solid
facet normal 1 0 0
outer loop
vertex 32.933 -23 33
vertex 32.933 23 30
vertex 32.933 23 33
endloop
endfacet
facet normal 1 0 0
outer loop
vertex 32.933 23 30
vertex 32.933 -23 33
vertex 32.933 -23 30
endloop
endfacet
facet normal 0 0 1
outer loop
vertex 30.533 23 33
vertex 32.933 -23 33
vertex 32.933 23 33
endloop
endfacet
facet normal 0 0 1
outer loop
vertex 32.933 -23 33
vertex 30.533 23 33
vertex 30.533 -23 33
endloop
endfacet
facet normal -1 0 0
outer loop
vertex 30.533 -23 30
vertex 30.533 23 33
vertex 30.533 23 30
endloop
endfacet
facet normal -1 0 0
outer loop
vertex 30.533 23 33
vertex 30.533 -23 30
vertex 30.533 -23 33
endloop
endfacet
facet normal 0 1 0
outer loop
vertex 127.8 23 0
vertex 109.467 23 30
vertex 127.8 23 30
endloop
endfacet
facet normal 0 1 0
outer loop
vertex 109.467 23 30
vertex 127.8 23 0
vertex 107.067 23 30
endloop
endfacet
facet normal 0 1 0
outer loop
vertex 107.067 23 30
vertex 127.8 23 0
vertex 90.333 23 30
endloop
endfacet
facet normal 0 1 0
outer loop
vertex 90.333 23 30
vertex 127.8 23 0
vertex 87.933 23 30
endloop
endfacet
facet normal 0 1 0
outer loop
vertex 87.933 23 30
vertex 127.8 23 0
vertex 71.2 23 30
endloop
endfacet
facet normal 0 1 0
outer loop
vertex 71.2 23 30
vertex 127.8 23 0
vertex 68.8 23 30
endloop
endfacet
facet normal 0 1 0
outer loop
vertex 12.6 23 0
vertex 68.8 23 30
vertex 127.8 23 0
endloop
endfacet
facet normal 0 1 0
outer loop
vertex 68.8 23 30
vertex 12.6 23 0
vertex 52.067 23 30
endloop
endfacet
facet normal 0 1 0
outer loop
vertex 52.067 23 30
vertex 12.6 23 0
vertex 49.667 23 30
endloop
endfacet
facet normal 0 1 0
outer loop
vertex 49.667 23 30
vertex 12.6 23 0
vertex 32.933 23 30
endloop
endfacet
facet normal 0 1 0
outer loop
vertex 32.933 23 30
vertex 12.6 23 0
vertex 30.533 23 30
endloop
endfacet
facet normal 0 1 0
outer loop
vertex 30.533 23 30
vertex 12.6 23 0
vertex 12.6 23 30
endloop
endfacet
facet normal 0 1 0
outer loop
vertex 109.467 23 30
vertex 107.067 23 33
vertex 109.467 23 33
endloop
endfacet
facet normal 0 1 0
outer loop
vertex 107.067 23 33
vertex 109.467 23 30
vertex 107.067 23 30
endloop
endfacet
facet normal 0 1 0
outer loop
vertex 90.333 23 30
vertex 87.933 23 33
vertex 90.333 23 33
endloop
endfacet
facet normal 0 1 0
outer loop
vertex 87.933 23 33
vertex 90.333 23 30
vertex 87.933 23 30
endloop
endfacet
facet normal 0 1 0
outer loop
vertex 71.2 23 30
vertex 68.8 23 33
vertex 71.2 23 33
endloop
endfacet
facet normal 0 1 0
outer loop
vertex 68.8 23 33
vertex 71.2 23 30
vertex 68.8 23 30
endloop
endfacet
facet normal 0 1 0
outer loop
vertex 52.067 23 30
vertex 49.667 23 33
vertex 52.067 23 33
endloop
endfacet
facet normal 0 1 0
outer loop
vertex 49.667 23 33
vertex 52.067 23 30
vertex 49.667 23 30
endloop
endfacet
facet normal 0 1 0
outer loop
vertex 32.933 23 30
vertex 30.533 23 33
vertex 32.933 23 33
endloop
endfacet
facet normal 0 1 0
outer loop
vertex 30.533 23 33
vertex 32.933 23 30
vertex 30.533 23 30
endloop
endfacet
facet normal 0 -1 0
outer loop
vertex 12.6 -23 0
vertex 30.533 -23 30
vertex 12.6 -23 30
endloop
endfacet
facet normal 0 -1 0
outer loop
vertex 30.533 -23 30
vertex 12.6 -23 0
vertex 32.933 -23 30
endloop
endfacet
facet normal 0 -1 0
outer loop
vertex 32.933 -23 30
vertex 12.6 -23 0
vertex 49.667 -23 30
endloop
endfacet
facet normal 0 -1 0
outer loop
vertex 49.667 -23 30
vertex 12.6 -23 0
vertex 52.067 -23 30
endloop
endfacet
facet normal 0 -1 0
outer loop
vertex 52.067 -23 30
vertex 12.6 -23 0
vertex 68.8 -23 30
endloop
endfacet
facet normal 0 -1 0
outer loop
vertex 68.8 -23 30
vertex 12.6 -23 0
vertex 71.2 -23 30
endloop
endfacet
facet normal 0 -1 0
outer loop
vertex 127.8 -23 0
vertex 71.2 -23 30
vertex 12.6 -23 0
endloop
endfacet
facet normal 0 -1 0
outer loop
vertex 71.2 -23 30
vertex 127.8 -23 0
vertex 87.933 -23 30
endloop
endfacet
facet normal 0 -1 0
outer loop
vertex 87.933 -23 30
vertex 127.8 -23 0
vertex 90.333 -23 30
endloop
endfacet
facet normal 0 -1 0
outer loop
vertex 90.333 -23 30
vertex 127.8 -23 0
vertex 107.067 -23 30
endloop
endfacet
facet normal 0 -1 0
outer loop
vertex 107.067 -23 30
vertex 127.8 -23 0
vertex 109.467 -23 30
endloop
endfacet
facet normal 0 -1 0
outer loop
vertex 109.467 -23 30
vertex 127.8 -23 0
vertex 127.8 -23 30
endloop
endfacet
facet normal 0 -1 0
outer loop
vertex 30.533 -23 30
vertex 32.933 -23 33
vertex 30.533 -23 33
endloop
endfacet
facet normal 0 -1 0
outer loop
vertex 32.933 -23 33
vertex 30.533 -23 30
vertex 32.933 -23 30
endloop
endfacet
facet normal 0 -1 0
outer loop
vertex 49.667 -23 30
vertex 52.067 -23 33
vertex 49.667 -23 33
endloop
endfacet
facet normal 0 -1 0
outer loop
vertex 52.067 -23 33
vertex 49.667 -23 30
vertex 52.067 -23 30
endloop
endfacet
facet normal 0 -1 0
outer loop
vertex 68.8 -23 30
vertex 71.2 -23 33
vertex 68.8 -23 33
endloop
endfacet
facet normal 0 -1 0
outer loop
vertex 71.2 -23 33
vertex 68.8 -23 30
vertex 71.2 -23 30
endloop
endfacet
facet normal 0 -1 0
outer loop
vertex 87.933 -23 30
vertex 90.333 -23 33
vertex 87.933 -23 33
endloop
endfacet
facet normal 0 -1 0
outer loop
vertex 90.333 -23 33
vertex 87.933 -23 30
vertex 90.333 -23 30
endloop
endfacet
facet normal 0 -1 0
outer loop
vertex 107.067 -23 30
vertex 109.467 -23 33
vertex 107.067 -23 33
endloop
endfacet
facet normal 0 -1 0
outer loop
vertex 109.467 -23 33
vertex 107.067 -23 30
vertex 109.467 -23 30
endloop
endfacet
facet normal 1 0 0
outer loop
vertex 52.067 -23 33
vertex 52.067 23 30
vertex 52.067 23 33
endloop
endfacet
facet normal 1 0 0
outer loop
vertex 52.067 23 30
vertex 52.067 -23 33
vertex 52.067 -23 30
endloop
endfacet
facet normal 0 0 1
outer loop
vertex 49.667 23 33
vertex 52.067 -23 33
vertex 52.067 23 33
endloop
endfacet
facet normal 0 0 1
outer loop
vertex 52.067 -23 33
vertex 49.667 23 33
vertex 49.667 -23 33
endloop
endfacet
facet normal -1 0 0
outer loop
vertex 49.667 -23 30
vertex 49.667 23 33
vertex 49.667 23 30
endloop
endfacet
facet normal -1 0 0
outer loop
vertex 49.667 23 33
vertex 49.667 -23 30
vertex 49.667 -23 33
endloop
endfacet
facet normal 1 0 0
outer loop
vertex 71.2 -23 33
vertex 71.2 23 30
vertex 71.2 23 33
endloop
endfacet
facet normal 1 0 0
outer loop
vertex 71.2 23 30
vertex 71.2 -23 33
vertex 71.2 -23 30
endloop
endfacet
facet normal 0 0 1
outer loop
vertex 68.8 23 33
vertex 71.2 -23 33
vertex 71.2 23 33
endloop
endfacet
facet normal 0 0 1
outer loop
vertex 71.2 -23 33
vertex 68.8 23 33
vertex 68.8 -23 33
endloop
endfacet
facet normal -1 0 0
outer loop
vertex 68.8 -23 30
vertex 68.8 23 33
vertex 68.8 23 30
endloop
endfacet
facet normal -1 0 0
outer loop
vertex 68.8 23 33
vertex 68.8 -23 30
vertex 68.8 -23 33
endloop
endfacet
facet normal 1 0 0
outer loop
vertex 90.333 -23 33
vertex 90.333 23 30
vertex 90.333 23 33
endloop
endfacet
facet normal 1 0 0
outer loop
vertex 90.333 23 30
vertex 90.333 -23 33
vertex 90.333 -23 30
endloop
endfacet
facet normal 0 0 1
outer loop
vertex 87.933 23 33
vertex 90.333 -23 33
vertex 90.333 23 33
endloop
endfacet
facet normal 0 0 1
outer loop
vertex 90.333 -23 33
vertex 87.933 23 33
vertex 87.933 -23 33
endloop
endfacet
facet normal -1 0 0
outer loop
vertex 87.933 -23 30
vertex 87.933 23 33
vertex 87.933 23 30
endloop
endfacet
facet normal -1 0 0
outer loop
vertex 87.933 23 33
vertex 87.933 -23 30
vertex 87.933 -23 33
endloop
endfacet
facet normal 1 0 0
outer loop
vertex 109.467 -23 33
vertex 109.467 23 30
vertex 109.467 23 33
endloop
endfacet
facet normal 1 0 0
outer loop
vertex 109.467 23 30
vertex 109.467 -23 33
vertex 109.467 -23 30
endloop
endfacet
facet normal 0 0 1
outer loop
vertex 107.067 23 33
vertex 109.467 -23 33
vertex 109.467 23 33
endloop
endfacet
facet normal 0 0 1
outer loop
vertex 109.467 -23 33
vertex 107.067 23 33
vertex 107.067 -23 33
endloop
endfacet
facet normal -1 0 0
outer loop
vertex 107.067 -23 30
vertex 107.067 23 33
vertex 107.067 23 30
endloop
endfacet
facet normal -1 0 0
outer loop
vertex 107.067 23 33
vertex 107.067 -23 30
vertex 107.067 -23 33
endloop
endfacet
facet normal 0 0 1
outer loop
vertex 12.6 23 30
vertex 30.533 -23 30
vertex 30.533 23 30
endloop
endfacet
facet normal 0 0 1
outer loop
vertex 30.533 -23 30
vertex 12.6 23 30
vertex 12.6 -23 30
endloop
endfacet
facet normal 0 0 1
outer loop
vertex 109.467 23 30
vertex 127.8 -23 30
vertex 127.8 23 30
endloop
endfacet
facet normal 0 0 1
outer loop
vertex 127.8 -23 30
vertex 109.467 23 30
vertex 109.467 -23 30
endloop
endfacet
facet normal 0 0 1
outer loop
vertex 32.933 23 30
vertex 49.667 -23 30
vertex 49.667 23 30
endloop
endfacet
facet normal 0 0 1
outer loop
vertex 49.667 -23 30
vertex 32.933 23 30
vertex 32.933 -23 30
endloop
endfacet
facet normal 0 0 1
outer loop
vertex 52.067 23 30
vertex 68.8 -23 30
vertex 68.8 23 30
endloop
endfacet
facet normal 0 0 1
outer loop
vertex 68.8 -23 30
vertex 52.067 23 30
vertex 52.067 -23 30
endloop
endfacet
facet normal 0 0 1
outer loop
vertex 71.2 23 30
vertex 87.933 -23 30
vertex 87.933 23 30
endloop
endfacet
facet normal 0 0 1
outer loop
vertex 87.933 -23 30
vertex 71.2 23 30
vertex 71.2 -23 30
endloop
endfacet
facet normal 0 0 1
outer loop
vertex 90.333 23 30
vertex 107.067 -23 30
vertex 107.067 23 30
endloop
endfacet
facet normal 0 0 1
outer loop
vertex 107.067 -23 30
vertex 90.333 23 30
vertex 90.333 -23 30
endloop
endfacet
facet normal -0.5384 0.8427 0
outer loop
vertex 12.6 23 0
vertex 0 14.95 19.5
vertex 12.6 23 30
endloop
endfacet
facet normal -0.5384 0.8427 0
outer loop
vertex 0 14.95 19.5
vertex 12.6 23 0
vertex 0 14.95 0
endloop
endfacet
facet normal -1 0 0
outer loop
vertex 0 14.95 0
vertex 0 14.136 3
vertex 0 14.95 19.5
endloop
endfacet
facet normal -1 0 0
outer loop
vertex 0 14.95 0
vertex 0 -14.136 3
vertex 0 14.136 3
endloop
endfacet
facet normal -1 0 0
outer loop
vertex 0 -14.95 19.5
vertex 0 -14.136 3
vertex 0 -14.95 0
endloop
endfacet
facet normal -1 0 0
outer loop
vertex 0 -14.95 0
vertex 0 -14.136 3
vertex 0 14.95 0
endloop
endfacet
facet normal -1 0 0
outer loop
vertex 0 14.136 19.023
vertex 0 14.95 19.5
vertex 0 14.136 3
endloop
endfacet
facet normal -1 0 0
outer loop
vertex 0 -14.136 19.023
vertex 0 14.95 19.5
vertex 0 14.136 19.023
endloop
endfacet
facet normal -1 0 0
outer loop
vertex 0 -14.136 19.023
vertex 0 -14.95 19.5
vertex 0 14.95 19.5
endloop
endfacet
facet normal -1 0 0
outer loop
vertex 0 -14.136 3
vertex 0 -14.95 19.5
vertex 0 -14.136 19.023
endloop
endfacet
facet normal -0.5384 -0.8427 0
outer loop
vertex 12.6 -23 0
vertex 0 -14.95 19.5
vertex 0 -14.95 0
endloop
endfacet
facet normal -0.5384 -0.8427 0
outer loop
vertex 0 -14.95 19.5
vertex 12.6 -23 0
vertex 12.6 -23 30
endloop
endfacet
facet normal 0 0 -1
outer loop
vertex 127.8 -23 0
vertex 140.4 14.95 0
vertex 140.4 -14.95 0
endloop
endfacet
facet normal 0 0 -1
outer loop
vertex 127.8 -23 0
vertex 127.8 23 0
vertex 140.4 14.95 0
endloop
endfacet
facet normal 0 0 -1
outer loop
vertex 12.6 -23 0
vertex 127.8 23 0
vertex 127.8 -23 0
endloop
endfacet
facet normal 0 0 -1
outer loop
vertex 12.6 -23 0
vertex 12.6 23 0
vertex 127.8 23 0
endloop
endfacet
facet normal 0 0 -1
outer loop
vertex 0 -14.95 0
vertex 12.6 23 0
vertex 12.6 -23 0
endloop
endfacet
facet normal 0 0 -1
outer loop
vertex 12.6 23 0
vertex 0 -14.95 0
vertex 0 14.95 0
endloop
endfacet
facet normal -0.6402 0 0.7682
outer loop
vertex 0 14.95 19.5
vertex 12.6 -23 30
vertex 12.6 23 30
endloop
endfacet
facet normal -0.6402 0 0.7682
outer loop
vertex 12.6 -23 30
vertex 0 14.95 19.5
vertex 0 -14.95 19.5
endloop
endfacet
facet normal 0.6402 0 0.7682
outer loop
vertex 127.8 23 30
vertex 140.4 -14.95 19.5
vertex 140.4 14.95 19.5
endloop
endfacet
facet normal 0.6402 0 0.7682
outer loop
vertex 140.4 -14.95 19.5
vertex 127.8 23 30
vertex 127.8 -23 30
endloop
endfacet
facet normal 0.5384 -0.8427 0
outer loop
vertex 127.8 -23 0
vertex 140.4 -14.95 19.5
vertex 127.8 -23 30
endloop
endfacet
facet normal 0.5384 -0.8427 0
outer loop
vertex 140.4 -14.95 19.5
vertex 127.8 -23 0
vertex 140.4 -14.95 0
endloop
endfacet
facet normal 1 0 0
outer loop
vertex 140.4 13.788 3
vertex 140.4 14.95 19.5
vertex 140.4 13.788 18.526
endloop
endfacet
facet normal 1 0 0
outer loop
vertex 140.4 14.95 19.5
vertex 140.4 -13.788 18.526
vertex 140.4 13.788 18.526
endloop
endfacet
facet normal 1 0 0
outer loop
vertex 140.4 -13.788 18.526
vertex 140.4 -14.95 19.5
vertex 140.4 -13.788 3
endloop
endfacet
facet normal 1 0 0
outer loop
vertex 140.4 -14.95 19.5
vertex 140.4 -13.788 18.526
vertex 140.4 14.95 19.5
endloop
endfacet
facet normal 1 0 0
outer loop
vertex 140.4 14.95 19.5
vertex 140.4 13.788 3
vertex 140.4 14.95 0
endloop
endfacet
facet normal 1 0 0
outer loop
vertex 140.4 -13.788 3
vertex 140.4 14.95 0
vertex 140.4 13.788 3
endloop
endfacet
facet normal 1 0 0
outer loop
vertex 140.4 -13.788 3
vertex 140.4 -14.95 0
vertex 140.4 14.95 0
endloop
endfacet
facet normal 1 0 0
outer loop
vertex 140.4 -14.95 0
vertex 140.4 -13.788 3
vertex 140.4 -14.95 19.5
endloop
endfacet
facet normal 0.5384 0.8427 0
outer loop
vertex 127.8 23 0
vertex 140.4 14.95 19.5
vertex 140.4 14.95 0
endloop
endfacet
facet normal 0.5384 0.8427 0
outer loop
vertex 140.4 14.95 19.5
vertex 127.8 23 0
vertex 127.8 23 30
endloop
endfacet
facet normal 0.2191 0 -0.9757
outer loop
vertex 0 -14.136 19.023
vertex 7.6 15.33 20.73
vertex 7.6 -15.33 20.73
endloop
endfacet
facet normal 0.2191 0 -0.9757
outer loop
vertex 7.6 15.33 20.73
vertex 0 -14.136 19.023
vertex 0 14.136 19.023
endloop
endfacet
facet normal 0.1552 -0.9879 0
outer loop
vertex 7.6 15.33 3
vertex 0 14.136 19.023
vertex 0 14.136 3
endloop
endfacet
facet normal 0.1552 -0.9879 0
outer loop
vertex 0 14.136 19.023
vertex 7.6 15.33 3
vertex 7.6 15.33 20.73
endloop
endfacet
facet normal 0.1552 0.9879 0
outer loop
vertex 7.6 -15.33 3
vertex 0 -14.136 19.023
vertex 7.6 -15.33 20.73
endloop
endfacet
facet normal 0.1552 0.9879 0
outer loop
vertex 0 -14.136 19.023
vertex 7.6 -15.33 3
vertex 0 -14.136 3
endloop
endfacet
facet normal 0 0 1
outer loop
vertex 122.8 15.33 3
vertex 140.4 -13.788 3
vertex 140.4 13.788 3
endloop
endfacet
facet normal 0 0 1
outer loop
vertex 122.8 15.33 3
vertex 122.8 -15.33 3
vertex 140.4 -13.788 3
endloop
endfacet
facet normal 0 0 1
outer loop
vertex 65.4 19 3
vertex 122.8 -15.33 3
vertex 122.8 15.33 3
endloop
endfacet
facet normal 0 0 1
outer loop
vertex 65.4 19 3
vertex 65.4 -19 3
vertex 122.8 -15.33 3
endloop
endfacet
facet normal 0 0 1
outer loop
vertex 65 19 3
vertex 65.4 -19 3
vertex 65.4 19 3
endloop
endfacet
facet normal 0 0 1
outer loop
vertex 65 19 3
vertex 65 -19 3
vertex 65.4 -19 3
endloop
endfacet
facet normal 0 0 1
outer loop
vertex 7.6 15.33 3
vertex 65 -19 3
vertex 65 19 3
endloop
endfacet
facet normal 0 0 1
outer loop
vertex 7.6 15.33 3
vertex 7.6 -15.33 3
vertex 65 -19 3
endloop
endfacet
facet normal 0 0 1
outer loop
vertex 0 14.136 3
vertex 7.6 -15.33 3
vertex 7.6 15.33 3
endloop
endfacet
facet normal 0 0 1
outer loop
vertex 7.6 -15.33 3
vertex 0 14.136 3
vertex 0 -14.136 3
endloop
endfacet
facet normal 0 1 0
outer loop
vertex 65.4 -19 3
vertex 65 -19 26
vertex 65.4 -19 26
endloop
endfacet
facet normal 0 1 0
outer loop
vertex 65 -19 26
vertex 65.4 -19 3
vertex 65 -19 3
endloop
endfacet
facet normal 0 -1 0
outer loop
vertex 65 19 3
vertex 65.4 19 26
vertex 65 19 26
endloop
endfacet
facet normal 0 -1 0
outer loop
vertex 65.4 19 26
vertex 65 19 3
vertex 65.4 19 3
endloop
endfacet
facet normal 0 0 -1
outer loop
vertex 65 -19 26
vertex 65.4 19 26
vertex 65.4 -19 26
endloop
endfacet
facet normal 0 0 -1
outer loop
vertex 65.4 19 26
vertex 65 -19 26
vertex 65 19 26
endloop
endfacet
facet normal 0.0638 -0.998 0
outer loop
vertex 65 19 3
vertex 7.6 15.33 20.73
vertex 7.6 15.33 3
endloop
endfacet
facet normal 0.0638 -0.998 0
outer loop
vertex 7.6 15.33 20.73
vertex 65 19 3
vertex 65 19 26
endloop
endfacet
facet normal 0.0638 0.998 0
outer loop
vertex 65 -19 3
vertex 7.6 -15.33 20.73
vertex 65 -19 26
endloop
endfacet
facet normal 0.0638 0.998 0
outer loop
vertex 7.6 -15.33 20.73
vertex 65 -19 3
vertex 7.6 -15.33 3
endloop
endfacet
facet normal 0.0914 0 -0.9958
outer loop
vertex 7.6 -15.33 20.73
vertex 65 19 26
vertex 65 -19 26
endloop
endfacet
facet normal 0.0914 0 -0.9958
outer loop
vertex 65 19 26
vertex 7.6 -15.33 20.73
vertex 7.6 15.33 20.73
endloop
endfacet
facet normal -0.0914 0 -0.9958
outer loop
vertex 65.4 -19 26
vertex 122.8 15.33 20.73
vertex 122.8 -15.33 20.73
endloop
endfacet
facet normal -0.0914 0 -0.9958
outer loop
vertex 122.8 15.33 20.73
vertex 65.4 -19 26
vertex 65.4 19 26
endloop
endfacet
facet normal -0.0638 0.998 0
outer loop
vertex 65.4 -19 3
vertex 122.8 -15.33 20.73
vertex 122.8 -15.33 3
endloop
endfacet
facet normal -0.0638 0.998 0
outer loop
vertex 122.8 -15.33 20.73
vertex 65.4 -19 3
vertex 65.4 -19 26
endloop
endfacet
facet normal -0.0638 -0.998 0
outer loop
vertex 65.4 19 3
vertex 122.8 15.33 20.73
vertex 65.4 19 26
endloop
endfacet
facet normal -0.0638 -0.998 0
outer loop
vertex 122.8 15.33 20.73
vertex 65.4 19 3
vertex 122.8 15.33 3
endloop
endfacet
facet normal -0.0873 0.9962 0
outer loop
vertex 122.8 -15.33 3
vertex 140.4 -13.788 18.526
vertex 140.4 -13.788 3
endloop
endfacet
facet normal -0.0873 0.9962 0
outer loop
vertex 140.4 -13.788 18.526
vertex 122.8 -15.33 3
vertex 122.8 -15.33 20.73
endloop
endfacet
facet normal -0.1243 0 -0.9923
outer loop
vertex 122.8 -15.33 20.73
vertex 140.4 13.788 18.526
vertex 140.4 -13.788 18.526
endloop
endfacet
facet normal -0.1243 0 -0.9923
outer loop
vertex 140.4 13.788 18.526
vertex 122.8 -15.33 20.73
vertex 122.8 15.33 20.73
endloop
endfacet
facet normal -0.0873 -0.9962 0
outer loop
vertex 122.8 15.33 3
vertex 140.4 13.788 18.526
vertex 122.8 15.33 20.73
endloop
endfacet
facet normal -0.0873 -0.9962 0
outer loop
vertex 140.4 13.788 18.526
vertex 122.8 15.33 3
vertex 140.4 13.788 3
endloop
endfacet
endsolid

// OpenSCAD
$fn = 32;

// ----------------------------------------------------------------------
// Faired channel: 140 x 46 x 30 mm, 4 mm walls, faired ends
// ----------------------------------------------------------------------

// --- parameters (mm) ---
length = 140;             // channel length
width = 46;               // channel width at mid length
height = 30;              // channel height at mid length
wall = 4;                 // side wall thickness
floor_t = 3;              // floor thickness
end_w = 29.9;             // faired end width
end_h = 19.5;             // faired end height
ribs = 5;                 // stiffening ribs on the top
rib_t = 2.4;              // rib thickness
rib_h = 3;                // rib height

difference() {
  union() {
    hull() {
      translate([0, -14.95, 0]) cube([0.4, 29.9, 19.5]);
      translate([12.6, -23, 0]) cube([0.4, 46, 30]);
    }
    hull() {
      translate([12.6, -23, 0]) cube([0.4, 46, 30]);
      translate([70, -23, 0]) cube([0.4, 46, 30]);
    }
    hull() {
      translate([70, -23, 0]) cube([0.4, 46, 30]);
      translate([127.4, -23, 0]) cube([0.4, 46, 30]);
    }
    hull() {
      translate([127.4, -23, 0]) cube([0.4, 46, 30]);
      translate([140, -14.95, 0]) cube([0.4, 29.9, 19.5]);
    }
    /* stiffening ribs across the flat top, sunk 0.8 mm into it */
    for (i = [1 : ribs]) {
      translate([12.6 + i * (length - 2 * 12.6) / (ribs + 1) - rib_t / 2, -width / 2, height - 0.8]) cube([rib_t, width, rib_h + 0.8]);
    }
  }
  /* cavity, 5 mm proud of both ends so the ports are cut clean */
  hull() {
    translate([-5, -13.35, 3]) cube([0.4, 26.7, 14.9]);
    translate([7.6, -15.33, 3]) cube([0.4, 30.66, 17.73]);
  }
  hull() {
    translate([7.6, -15.33, 3]) cube([0.4, 30.66, 17.73]);
    translate([65, -19, 3]) cube([0.4, 38, 23]);
  }
  hull() {
    translate([65, -19, 3]) cube([0.4, 38, 23]);
    translate([122.4, -15.33, 3]) cube([0.4, 30.66, 17.73]);
  }
  hull() {
    translate([122.4, -15.33, 3]) cube([0.4, 30.66, 17.73]);
    translate([145, -13.35, 3]) cube([0.4, 26.7, 14.9]);
  }
}
